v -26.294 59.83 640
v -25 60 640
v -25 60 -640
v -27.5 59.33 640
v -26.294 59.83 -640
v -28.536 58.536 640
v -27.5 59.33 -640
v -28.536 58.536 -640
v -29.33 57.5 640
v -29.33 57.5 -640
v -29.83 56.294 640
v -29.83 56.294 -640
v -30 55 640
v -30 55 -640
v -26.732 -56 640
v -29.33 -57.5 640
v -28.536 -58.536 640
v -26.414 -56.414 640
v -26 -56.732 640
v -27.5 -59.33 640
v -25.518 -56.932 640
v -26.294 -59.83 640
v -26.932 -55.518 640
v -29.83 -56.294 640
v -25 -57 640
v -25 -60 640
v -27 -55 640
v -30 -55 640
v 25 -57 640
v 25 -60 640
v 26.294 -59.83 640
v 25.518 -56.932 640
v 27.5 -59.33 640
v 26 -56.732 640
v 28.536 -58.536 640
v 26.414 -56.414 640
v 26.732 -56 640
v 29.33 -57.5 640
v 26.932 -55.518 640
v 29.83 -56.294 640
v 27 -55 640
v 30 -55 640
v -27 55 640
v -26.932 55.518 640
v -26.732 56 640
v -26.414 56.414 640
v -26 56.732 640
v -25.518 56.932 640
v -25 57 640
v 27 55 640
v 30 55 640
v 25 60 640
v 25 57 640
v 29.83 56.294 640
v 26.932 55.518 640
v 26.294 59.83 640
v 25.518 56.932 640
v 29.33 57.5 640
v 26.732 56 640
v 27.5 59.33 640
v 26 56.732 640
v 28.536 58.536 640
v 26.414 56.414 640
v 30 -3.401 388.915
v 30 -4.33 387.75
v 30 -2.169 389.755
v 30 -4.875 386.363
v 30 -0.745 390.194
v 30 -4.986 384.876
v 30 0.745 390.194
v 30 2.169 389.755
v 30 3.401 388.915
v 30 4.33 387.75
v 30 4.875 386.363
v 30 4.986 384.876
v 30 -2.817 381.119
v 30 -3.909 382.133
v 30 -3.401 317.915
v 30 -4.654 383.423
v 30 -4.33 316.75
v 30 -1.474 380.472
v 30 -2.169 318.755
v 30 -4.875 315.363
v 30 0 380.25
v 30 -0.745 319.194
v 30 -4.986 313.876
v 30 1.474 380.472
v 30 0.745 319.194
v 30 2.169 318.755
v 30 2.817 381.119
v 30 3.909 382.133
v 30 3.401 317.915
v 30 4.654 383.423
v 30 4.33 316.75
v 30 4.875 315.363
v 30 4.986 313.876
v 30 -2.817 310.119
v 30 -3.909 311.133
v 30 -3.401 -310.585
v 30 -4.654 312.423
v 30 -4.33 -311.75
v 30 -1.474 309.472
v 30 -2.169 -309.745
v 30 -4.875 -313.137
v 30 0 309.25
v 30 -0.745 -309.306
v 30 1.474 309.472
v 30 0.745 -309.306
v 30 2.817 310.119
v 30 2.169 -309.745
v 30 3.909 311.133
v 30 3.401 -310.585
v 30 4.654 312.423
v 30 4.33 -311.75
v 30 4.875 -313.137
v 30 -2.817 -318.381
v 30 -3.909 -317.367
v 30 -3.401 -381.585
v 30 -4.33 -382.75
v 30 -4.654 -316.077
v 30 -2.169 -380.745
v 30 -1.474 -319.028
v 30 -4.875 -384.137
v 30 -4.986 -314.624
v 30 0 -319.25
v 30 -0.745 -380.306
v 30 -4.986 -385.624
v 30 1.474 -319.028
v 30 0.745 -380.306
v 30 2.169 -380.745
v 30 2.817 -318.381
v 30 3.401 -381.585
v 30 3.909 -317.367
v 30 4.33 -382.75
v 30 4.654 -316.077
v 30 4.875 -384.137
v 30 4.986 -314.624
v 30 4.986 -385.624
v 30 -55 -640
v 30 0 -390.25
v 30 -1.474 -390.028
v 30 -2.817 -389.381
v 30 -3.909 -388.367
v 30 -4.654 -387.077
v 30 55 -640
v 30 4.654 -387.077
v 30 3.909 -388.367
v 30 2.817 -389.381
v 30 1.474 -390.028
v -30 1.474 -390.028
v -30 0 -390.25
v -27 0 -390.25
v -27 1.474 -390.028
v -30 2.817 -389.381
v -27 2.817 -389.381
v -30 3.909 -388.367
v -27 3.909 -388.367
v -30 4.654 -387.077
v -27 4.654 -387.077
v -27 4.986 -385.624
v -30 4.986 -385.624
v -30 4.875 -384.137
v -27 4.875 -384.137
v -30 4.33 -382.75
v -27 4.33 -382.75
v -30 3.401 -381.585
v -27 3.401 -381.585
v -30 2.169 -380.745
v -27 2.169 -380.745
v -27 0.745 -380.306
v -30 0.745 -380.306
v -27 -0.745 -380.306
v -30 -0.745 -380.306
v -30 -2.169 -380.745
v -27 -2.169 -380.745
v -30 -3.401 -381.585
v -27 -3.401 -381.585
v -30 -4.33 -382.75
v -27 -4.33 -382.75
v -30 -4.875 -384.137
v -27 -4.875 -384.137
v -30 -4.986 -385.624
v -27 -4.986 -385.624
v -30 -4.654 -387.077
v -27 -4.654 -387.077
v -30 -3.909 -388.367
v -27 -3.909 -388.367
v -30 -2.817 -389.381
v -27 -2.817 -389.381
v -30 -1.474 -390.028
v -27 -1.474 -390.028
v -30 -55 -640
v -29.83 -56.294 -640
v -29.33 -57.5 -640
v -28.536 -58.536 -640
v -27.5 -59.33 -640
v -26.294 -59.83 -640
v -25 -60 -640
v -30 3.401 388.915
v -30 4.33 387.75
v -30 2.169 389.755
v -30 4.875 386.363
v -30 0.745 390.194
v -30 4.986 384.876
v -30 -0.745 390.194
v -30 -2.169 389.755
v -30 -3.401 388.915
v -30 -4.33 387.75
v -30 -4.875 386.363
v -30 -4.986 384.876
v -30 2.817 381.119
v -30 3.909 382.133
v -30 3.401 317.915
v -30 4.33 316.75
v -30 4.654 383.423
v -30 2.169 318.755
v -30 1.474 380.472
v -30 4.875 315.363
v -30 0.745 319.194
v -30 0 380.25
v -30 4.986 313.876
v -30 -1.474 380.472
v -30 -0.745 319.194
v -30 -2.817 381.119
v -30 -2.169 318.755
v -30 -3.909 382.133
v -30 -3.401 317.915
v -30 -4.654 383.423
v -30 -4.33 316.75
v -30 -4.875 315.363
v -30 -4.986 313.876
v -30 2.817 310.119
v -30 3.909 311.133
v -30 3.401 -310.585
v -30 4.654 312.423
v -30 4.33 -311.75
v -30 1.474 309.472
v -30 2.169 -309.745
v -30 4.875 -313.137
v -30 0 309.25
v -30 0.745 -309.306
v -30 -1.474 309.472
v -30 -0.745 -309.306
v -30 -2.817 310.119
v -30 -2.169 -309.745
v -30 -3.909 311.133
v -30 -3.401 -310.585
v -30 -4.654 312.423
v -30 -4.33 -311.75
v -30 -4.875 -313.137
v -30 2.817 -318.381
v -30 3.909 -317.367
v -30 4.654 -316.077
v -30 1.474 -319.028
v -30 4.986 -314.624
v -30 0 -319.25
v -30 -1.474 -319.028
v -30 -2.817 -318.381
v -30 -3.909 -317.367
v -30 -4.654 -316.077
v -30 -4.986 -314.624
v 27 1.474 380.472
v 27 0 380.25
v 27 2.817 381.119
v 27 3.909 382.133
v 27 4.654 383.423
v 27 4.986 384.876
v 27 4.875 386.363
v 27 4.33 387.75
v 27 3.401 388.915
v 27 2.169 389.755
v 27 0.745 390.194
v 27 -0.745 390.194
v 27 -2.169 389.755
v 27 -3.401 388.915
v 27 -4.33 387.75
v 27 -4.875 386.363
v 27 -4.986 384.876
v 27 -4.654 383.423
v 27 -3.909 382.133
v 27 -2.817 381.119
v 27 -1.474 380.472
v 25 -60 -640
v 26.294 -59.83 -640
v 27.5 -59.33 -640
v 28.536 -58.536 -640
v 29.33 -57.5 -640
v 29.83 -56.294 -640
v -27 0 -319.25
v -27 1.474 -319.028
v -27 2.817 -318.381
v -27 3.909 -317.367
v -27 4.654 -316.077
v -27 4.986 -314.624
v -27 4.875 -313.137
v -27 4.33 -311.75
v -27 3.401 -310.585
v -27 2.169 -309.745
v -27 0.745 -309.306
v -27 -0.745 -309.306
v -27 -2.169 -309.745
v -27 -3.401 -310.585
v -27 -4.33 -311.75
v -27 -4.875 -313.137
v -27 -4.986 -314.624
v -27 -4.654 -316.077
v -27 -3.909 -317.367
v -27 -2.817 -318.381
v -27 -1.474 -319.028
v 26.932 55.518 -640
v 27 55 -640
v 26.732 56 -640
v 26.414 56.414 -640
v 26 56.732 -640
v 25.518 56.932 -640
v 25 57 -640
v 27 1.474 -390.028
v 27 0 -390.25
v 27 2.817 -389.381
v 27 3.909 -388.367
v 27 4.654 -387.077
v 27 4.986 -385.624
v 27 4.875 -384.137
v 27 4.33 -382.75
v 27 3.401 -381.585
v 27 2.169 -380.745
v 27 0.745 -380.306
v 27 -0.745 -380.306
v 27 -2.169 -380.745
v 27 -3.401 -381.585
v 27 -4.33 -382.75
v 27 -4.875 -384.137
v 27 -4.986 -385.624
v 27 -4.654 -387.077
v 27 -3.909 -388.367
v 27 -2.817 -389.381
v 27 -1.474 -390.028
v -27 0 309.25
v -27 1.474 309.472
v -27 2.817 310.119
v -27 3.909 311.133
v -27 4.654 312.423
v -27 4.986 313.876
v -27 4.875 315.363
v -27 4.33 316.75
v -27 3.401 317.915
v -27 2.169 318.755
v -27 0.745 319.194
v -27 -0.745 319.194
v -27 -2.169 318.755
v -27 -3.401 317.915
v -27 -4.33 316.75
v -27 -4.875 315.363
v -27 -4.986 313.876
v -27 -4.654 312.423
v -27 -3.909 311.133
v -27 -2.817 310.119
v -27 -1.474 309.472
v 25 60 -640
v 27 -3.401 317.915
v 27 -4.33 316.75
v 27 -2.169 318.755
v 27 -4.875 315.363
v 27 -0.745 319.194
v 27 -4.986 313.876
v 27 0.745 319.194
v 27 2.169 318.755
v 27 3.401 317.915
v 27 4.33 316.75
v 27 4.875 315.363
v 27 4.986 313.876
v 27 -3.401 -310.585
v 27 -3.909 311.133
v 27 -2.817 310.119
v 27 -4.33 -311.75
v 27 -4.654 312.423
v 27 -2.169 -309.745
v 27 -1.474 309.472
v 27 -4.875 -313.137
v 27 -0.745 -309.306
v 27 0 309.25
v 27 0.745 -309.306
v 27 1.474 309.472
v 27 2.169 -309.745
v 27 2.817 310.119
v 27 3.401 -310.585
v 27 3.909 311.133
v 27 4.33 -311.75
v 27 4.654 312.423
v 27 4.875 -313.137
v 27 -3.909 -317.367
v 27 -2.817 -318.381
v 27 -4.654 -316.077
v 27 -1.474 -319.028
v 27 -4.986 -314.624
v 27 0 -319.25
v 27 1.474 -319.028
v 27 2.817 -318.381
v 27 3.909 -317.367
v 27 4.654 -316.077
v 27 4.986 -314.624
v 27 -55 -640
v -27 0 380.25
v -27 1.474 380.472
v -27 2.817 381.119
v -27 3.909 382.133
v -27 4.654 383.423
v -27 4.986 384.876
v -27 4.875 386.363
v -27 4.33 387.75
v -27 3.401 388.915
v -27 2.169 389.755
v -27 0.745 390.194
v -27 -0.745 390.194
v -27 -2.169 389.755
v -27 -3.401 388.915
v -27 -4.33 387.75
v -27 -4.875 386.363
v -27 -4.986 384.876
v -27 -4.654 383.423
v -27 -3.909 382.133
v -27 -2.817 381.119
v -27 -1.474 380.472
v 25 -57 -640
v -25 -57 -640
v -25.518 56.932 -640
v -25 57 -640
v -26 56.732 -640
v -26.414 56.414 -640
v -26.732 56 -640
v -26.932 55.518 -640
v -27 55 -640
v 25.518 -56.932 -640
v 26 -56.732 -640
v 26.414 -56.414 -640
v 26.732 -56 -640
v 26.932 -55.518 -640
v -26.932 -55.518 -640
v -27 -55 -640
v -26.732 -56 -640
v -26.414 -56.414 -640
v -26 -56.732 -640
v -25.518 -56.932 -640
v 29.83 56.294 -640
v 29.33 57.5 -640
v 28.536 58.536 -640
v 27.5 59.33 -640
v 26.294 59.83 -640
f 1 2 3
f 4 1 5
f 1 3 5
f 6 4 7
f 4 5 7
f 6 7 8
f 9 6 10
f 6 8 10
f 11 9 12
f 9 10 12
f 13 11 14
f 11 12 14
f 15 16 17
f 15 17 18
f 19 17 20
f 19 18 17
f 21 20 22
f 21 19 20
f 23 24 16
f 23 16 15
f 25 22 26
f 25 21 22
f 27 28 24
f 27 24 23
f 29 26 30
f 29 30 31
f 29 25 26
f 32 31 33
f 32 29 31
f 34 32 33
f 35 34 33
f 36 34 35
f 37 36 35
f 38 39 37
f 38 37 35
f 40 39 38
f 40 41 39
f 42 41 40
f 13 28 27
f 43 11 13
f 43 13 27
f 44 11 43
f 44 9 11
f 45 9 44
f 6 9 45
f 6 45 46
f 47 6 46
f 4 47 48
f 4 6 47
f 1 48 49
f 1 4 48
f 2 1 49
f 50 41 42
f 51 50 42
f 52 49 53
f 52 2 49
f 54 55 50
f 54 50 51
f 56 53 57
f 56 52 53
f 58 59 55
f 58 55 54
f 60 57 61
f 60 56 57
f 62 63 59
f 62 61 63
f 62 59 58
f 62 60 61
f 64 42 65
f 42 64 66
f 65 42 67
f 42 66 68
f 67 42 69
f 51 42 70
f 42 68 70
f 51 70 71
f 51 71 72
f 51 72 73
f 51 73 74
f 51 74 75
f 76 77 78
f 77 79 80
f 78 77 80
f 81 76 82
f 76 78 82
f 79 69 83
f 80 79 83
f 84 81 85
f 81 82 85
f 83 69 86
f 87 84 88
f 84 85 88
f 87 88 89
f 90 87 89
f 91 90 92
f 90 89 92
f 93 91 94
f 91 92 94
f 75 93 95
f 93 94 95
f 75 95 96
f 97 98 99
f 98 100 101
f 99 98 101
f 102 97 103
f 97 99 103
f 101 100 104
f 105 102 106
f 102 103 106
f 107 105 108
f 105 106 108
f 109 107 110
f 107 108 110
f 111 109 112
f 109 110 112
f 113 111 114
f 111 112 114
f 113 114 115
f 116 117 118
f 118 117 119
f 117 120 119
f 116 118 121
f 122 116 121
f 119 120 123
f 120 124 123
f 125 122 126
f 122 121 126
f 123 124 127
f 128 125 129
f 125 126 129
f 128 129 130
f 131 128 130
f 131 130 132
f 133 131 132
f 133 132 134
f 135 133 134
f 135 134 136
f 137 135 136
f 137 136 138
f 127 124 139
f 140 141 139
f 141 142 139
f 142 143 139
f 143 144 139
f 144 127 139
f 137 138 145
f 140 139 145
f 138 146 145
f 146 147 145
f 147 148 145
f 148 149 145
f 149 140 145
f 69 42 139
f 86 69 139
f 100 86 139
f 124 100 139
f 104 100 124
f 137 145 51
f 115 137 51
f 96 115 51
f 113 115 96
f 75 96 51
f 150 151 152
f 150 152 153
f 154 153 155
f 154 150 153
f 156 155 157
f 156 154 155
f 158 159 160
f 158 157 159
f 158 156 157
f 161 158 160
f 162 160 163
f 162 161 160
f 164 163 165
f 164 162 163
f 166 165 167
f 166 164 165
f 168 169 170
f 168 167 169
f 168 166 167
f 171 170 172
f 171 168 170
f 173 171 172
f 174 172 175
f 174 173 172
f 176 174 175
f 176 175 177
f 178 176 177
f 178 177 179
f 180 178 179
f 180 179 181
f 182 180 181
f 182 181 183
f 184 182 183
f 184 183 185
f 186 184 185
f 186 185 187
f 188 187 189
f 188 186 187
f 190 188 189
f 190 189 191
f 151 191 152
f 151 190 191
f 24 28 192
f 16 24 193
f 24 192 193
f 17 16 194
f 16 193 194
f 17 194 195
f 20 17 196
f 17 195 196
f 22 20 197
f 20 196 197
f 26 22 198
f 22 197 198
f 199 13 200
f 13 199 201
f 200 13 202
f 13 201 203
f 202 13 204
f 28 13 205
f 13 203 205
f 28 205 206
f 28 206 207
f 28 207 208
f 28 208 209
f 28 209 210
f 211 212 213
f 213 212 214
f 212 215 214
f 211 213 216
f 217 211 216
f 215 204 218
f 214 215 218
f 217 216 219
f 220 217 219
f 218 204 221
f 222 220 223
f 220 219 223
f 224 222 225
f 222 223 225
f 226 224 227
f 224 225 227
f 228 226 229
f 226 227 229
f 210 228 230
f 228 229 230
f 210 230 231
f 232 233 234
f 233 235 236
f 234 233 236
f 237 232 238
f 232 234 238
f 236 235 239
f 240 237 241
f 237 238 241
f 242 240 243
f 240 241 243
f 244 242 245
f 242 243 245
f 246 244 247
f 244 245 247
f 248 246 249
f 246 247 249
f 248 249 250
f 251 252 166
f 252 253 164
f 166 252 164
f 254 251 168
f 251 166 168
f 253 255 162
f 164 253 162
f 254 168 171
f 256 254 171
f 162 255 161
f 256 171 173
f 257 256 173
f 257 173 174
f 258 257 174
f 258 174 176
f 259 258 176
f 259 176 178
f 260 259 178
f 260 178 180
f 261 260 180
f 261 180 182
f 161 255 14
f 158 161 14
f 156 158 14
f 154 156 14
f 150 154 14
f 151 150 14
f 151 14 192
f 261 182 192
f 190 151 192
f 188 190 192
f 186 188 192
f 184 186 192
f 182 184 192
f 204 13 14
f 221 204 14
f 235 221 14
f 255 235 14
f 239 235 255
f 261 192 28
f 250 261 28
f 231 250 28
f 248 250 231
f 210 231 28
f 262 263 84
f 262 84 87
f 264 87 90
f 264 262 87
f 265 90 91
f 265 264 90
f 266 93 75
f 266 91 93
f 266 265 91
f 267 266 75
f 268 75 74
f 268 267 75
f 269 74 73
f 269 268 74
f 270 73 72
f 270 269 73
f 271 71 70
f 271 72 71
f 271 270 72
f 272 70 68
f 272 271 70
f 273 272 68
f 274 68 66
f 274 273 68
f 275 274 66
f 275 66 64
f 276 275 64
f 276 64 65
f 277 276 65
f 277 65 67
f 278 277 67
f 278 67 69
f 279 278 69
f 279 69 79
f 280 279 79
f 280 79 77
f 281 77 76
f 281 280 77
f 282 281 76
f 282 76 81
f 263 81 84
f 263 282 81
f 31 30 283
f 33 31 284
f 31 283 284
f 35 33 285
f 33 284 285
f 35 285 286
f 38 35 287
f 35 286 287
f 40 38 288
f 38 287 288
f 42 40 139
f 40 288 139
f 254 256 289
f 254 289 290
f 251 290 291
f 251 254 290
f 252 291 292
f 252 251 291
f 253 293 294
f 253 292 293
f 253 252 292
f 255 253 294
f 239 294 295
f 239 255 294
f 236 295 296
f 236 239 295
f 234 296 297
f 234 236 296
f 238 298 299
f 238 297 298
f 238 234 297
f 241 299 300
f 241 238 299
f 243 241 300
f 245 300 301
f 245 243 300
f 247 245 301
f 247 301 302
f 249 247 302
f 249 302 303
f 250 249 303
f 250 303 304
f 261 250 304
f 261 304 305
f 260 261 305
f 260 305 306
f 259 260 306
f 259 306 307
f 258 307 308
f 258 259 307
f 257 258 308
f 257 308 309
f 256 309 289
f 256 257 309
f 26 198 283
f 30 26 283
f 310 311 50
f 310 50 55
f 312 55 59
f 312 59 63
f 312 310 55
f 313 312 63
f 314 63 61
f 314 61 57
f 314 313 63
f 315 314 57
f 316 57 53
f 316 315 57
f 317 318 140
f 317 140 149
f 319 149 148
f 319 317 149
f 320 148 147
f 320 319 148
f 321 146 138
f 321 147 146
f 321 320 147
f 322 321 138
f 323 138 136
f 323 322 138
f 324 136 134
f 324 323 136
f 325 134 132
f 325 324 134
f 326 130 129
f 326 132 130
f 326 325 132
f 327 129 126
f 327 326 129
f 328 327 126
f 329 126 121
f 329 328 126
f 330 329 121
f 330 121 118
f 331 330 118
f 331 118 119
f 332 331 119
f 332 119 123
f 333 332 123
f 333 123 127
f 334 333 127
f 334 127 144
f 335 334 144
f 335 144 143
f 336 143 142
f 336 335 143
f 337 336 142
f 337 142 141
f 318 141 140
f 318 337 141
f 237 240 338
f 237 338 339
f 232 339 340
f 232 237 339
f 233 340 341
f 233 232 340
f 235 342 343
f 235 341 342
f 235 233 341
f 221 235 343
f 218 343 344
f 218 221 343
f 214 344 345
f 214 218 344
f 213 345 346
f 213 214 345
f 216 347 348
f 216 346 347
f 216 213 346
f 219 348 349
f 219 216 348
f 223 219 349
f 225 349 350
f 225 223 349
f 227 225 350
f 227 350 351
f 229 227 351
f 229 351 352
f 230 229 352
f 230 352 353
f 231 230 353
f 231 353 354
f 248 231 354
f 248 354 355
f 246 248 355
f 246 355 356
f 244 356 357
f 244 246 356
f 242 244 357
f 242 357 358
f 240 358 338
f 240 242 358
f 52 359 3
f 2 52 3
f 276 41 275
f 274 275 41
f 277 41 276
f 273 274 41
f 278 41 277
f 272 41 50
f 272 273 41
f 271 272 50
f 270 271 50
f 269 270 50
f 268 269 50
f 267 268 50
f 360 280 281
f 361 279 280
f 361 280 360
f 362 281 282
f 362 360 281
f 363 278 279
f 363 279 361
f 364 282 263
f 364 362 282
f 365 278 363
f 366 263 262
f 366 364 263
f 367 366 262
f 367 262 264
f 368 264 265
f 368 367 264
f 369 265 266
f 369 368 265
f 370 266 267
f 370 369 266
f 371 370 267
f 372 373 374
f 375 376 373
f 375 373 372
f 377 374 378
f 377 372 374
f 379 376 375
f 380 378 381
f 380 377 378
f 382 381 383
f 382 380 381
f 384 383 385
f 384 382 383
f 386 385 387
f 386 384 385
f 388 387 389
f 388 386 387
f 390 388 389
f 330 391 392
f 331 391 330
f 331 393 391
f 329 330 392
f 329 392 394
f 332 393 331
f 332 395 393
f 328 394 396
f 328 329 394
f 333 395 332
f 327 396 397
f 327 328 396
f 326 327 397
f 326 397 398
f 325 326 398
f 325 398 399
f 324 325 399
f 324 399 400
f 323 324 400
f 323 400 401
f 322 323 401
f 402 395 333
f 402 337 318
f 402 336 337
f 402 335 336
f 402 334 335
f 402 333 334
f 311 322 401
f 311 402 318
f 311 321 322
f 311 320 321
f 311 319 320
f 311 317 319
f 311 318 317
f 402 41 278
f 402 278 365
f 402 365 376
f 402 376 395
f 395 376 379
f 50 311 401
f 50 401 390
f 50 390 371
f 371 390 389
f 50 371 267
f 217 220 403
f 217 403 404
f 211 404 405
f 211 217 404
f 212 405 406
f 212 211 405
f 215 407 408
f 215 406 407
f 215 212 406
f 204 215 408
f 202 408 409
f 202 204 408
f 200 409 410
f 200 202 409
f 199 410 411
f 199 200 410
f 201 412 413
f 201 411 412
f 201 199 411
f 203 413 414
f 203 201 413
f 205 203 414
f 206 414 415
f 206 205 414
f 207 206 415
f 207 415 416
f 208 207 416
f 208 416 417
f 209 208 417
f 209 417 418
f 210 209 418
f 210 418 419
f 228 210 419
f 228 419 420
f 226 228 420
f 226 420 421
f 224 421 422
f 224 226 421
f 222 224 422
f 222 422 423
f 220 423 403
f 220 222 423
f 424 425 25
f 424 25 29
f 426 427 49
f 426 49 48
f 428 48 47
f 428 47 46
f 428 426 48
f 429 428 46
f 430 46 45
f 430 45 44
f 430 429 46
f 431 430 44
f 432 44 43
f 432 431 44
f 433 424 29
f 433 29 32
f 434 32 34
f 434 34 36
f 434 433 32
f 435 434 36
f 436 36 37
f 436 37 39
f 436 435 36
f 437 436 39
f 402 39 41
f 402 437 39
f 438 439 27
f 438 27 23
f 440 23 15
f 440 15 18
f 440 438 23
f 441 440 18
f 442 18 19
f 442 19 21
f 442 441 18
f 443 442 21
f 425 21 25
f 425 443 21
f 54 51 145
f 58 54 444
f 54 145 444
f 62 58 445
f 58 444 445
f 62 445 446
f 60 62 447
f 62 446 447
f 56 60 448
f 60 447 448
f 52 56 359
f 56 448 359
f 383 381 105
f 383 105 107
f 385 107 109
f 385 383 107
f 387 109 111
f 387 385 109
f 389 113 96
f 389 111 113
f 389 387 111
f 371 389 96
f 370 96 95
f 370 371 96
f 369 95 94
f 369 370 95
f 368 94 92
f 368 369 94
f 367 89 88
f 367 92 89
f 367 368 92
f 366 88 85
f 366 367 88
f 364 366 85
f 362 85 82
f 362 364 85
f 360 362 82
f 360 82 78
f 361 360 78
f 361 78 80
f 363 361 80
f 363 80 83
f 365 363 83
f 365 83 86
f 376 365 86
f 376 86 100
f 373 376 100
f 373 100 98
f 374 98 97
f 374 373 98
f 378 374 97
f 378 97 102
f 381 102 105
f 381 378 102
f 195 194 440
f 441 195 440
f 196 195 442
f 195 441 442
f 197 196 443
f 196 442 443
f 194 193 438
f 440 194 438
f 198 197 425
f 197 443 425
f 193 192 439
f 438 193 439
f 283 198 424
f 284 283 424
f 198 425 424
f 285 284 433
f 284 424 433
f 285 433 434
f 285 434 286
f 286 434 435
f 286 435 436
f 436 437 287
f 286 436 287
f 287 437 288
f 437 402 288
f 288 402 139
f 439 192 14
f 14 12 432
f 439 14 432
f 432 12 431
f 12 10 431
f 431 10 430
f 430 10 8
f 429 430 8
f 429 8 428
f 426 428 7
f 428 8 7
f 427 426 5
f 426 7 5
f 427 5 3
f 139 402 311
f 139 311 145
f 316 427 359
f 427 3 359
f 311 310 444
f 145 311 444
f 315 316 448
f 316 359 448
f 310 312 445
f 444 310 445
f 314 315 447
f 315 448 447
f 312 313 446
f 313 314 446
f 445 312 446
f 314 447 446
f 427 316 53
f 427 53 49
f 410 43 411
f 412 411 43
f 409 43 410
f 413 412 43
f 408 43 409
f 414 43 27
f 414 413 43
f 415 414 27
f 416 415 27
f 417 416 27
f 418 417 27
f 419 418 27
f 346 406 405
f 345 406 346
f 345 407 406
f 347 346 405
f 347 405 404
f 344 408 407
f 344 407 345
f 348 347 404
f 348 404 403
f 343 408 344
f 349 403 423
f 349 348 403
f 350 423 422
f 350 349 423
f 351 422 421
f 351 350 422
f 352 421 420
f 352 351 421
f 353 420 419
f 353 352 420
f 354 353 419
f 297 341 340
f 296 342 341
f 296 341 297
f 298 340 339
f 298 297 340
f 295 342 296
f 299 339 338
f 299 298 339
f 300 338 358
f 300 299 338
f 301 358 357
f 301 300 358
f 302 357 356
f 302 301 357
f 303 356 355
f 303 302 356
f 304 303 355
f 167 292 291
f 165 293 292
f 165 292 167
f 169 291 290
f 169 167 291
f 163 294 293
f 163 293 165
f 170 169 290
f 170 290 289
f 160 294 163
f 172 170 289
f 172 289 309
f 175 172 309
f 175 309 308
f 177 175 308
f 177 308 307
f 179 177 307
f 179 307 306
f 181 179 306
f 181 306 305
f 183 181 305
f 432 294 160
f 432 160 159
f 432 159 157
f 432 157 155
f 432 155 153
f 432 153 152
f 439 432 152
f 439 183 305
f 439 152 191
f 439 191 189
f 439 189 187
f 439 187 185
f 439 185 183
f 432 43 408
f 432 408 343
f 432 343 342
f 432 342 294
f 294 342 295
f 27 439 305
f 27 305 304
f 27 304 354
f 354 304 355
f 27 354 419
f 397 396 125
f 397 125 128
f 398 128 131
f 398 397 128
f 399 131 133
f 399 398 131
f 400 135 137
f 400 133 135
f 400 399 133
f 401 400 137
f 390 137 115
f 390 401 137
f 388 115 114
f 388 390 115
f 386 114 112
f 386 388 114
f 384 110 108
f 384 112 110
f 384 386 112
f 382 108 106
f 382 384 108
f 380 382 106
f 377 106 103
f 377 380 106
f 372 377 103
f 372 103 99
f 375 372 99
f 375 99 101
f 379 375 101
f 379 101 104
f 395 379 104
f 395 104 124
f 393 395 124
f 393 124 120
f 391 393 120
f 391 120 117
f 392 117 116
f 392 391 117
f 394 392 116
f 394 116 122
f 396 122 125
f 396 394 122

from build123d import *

# Parameters (mm, degrees)
EXTRUDE_THIN1_DEPTH      = 640
EXTRUDE_THIN1_DEPTH_BACK = 640
CUT_EXTRUDE1_DEPTH       = 644.506021728
CUT_EXTRUDE1_DEPTH_BACK  = 644.506021728
SKETCH2_R                = 5


with BuildPart() as part:
    # Sketch1 → Extrude-Thin1 (new, two sides: drawn at the far end of the back side and taken through both)
    with BuildSketch(Plane.XY.offset(-EXTRUDE_THIN1_DEPTH_BACK)):
        with BuildLine():
            Line((-30, 55), (-30, -55))
            ThreePointArc((-30, -55), (-28.535533906, -58.535533906), (-25, -60))
            Line((-25, -60), (25, -60))
            ThreePointArc((25, -60), (28.535533906, -58.535533906), (30, -55))
            Line((30, -55), (30, 55))
            ThreePointArc((30, 55), (28.535533906, 58.535533906), (25, 60))
            Line((25, 60), (-25, 60))
            ThreePointArc((-25, 60), (-28.535533906, 58.535533906), (-30, 55))
        make_face()
        with BuildLine():
            Line((-27, 55), (-27, -55))
            ThreePointArc((-27, -55), (-26.414213562, -56.414213562), (-25, -57))
            Line((-25, -57), (25, -57))
            ThreePointArc((25, -57), (26.414213562, -56.414213562), (27, -55))
            Line((27, -55), (27, 55))
            ThreePointArc((27, 55), (26.414213562, 56.414213562), (25, 57))
            Line((25, 57), (-25, 57))
            ThreePointArc((-25, 57), (-26.414213562, 56.414213562), (-27, 55))
        make_face(mode=Mode.SUBTRACT)
    extrude(amount=EXTRUDE_THIN1_DEPTH + EXTRUDE_THIN1_DEPTH_BACK)

    # Sketch2 → Cut-Extrude1 (cut, two sides: drawn at the far end of the back side and taken through both)
    with BuildSketch(Plane(origin=(0, 0, 0), x_dir=(0, 0, -1), z_dir=(1, 0, 0)).offset(-CUT_EXTRUDE1_DEPTH_BACK)):
        with Locations((-314.25, 0)):
            Circle(SKETCH2_R)
        with Locations((-385.25, 0)):
            Circle(SKETCH2_R)
        with Locations((314.25, 0)):
            Circle(SKETCH2_R)
        with Locations((385.25, 0)):
            Circle(SKETCH2_R)
    extrude(amount=CUT_EXTRUDE1_DEPTH + CUT_EXTRUDE1_DEPTH_BACK, mode=Mode.SUBTRACT)


solid = part.part
